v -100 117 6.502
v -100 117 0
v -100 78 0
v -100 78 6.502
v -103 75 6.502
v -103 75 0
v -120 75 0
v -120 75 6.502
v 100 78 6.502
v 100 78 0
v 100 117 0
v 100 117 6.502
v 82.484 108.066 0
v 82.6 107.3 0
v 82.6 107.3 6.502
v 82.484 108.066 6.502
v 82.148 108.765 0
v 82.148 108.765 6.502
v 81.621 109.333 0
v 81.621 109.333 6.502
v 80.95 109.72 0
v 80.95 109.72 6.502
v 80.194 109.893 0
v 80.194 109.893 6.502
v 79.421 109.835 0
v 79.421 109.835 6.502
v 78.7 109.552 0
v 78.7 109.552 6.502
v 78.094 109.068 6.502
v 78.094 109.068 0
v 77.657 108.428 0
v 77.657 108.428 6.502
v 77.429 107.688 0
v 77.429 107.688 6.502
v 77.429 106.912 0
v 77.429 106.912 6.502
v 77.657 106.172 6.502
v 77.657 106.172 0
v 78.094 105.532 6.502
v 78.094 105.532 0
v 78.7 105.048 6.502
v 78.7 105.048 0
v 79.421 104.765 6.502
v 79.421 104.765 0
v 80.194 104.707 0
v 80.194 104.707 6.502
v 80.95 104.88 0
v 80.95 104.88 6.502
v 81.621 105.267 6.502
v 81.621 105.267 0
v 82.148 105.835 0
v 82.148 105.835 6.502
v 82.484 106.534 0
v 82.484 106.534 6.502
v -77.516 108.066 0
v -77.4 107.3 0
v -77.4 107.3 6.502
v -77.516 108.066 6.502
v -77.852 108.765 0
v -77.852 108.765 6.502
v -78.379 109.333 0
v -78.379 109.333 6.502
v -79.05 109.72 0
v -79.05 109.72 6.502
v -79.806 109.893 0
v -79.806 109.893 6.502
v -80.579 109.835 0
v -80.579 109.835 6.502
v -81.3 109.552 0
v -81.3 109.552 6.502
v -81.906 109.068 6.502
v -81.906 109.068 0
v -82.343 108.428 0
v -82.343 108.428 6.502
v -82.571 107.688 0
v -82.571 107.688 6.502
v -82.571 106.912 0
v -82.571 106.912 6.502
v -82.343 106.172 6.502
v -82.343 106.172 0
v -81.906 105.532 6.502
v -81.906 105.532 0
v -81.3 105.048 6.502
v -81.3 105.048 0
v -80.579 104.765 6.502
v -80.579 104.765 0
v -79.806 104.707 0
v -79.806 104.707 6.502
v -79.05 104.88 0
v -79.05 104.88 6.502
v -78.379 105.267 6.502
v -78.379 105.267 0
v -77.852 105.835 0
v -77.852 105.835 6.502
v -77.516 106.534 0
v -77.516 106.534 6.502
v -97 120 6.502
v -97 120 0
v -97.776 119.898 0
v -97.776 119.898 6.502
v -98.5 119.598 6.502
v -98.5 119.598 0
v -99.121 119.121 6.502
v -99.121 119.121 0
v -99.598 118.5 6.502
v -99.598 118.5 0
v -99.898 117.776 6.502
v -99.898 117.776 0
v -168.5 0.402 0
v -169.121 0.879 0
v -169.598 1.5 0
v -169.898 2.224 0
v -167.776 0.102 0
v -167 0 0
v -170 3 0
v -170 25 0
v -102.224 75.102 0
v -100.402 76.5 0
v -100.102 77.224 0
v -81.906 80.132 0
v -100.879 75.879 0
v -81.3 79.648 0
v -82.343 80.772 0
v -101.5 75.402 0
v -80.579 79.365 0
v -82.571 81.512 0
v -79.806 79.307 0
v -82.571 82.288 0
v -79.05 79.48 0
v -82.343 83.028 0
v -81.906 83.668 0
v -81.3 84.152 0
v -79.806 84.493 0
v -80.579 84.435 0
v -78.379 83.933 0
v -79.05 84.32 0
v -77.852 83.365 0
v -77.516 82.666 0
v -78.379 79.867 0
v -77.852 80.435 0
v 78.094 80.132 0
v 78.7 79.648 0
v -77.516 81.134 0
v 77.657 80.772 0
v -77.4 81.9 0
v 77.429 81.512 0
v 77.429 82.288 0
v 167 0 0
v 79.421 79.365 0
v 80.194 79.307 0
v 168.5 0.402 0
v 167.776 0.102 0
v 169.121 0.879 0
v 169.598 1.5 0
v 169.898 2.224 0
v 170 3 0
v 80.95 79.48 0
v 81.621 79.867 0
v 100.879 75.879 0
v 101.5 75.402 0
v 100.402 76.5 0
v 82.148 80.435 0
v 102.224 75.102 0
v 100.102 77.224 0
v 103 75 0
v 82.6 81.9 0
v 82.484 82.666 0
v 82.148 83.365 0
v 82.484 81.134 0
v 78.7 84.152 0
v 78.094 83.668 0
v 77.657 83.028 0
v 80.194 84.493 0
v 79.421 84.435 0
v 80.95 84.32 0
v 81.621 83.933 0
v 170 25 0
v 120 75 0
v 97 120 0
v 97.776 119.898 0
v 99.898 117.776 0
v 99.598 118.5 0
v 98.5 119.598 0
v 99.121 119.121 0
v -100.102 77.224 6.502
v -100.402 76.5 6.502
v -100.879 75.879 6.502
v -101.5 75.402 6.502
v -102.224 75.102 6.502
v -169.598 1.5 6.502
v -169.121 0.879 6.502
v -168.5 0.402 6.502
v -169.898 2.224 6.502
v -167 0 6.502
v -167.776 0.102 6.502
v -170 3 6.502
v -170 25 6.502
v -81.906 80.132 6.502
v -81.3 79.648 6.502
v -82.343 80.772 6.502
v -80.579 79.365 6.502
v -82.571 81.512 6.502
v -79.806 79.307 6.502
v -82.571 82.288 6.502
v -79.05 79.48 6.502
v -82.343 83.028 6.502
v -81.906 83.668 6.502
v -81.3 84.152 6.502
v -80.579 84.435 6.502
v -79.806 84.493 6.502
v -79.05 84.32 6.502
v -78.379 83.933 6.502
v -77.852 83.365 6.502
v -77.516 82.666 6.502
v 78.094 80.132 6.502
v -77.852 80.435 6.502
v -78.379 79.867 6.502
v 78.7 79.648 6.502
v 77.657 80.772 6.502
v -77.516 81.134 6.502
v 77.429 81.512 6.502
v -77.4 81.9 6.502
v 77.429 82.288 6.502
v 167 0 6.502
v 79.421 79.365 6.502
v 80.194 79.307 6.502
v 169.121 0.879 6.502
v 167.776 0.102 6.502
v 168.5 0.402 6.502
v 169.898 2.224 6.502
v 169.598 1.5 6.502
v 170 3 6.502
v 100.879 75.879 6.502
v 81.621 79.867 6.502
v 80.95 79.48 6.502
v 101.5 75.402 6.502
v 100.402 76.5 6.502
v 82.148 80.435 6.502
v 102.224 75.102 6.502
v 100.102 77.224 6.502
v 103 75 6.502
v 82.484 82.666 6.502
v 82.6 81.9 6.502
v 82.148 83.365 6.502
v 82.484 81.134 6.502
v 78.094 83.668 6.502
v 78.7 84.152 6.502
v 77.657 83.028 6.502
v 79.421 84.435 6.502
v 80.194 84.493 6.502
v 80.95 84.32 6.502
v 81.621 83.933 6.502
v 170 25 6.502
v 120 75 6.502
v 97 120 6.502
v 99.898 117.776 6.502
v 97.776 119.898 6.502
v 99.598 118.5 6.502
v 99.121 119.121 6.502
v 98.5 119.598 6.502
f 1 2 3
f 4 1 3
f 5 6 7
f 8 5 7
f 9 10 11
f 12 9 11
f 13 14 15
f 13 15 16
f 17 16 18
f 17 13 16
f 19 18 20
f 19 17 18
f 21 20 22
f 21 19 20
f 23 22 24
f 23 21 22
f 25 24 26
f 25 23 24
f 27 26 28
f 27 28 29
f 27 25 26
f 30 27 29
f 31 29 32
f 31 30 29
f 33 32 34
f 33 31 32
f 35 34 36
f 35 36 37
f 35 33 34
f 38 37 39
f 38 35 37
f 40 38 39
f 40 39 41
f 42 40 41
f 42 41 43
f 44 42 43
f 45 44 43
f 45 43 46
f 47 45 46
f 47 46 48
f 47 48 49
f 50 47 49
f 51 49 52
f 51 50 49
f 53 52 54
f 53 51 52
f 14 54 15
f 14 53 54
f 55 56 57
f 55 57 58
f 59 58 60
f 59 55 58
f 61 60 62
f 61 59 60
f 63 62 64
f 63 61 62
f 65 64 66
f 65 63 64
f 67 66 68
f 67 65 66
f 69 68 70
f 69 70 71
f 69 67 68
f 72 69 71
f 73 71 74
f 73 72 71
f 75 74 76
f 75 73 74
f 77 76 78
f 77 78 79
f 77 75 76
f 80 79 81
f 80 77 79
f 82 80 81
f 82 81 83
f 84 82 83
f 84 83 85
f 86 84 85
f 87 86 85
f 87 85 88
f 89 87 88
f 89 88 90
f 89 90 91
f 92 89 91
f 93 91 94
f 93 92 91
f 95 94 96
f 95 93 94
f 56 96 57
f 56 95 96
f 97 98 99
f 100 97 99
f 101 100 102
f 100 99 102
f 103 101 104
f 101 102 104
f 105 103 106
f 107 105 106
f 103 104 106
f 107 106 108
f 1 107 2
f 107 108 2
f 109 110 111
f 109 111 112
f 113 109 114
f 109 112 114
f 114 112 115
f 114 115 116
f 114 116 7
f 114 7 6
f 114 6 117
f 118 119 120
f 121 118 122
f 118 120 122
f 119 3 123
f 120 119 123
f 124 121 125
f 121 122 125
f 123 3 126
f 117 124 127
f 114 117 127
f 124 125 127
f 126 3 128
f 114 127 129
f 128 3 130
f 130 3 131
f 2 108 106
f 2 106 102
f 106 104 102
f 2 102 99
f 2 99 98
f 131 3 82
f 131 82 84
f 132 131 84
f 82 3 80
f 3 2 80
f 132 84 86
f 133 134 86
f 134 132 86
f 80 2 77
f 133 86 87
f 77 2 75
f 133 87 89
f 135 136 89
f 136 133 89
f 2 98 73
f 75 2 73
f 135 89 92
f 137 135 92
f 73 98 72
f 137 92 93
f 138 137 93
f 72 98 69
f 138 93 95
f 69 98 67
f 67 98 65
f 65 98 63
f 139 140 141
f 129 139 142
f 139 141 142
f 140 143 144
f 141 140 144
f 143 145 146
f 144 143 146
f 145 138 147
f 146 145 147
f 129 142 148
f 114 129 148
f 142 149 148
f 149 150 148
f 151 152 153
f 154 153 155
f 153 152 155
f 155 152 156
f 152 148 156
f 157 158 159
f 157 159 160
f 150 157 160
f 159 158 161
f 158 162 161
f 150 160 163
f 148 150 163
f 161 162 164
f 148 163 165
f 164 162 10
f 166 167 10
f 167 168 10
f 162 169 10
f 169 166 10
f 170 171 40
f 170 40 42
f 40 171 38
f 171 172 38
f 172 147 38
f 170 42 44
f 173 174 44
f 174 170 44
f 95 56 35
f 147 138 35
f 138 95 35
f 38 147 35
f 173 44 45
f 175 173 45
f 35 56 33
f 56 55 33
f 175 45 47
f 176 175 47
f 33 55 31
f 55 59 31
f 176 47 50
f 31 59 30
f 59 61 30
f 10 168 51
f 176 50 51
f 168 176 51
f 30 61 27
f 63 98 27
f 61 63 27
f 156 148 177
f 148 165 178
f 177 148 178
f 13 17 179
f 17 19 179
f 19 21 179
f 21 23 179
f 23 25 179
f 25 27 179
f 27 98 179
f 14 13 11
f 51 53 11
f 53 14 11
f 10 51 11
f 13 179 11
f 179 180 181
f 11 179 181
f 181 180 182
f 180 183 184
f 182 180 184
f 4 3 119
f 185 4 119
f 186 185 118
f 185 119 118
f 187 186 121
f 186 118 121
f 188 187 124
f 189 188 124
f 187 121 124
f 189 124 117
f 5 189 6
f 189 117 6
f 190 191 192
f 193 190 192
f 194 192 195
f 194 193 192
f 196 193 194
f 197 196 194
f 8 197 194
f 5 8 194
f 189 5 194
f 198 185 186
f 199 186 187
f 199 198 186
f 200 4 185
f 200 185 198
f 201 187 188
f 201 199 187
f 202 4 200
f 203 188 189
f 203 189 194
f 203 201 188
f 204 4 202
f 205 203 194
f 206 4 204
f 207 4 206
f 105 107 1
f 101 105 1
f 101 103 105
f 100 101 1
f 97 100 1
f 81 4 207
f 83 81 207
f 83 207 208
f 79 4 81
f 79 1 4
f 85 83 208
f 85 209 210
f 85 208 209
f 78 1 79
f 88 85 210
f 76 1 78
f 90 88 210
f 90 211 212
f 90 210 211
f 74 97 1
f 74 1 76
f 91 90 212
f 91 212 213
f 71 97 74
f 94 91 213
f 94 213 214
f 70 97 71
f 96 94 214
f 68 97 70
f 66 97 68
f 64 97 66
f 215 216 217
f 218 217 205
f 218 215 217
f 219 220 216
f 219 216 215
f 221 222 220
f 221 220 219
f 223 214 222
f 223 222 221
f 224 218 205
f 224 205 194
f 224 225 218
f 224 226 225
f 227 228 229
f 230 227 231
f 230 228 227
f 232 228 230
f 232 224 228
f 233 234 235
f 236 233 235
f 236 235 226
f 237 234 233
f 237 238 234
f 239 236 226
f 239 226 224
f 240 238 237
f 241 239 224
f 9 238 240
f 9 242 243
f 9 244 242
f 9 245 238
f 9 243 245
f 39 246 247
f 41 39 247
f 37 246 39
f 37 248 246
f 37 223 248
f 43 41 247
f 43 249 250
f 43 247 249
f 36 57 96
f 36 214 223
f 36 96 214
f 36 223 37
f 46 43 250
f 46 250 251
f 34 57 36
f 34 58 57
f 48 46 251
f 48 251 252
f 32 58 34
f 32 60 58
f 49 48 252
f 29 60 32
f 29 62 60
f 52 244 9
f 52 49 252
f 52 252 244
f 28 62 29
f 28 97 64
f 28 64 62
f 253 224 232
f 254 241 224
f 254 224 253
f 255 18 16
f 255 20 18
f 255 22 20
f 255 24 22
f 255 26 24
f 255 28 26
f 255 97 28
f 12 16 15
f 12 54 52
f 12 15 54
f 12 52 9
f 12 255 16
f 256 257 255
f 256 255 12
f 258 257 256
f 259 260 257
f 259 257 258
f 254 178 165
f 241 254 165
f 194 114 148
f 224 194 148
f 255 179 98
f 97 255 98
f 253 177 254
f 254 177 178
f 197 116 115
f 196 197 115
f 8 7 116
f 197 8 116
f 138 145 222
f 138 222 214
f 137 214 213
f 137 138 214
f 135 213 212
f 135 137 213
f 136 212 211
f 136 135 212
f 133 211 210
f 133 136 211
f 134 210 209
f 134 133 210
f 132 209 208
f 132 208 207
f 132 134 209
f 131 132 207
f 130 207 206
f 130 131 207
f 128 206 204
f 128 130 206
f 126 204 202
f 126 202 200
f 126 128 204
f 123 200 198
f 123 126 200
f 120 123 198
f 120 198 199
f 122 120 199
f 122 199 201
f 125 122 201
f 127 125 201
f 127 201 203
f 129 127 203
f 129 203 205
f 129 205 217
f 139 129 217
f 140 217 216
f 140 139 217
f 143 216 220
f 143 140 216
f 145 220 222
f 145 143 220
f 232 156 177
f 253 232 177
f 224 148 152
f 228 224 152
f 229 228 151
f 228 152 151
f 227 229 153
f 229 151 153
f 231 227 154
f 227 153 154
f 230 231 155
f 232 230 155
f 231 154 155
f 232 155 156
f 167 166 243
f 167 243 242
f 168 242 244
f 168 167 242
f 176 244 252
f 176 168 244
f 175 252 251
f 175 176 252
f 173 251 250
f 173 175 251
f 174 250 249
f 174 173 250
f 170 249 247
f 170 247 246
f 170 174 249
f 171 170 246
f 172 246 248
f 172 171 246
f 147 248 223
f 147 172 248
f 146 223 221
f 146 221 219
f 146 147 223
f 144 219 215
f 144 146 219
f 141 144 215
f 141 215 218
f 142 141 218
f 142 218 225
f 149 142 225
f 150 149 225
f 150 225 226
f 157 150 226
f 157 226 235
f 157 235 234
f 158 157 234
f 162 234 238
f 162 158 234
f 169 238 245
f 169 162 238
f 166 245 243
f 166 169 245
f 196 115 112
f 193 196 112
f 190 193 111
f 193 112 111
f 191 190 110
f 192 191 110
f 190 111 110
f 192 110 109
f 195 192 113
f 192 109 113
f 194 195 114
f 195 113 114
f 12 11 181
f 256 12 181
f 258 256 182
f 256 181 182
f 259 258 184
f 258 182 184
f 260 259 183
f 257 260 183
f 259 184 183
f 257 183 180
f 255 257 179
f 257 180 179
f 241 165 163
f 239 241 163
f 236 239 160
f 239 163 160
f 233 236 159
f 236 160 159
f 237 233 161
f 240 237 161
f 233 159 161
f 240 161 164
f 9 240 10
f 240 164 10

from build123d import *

# Parameters (mm, degrees)
F0_R     = 2.6
F1_DEPTH = 6.5024


with BuildPart() as f1:
    # F0 (on Top) → F1 (new body)
    with BuildSketch(Plane.XY):
        with BuildLine():
            Line((-103, 75), (-120, 75))
            Line((-120, 75), (-170, 25))
            Line((-170, 25), (-170, 3))
            ThreePointArc((-170, 3), (-169.12132, 0.87868), (-167, 0))
            Line((-167, 0), (0, 0))
            Line((0, 0), (167, 0))
            ThreePointArc((167, 0), (169.12132, 0.87868), (170, 3))
            Line((170, 3), (170, 25))
            Line((170, 25), (120, 75))
            Line((120, 75), (103, 75))
            ThreePointArc((103, 75), (100.87868, 75.87868), (100, 78))
            Line((100, 78), (100, 117))
            ThreePointArc((100, 117), (99.12132, 119.12132), (97, 120))
            Line((97, 120), (0, 120))
            Line((0, 120), (-97, 120))
            ThreePointArc((-97, 120), (-99.12132, 119.12132), (-100, 117))
            Line((-100, 117), (-100, 78))
            ThreePointArc((-100, 78), (-100.87868, 75.87868), (-103, 75))
        make_face()
        with Locations((-80, 81.9)):
            Circle(F0_R, mode=Mode.SUBTRACT)
        with Locations((-80, 107.3)):
            Circle(F0_R, mode=Mode.SUBTRACT)
        with Locations((80, 81.9)):
            Circle(F0_R, mode=Mode.SUBTRACT)
        with Locations((80, 107.3)):
            Circle(F0_R, mode=Mode.SUBTRACT)
    extrude(amount=F1_DEPTH)


solid = f1.part
